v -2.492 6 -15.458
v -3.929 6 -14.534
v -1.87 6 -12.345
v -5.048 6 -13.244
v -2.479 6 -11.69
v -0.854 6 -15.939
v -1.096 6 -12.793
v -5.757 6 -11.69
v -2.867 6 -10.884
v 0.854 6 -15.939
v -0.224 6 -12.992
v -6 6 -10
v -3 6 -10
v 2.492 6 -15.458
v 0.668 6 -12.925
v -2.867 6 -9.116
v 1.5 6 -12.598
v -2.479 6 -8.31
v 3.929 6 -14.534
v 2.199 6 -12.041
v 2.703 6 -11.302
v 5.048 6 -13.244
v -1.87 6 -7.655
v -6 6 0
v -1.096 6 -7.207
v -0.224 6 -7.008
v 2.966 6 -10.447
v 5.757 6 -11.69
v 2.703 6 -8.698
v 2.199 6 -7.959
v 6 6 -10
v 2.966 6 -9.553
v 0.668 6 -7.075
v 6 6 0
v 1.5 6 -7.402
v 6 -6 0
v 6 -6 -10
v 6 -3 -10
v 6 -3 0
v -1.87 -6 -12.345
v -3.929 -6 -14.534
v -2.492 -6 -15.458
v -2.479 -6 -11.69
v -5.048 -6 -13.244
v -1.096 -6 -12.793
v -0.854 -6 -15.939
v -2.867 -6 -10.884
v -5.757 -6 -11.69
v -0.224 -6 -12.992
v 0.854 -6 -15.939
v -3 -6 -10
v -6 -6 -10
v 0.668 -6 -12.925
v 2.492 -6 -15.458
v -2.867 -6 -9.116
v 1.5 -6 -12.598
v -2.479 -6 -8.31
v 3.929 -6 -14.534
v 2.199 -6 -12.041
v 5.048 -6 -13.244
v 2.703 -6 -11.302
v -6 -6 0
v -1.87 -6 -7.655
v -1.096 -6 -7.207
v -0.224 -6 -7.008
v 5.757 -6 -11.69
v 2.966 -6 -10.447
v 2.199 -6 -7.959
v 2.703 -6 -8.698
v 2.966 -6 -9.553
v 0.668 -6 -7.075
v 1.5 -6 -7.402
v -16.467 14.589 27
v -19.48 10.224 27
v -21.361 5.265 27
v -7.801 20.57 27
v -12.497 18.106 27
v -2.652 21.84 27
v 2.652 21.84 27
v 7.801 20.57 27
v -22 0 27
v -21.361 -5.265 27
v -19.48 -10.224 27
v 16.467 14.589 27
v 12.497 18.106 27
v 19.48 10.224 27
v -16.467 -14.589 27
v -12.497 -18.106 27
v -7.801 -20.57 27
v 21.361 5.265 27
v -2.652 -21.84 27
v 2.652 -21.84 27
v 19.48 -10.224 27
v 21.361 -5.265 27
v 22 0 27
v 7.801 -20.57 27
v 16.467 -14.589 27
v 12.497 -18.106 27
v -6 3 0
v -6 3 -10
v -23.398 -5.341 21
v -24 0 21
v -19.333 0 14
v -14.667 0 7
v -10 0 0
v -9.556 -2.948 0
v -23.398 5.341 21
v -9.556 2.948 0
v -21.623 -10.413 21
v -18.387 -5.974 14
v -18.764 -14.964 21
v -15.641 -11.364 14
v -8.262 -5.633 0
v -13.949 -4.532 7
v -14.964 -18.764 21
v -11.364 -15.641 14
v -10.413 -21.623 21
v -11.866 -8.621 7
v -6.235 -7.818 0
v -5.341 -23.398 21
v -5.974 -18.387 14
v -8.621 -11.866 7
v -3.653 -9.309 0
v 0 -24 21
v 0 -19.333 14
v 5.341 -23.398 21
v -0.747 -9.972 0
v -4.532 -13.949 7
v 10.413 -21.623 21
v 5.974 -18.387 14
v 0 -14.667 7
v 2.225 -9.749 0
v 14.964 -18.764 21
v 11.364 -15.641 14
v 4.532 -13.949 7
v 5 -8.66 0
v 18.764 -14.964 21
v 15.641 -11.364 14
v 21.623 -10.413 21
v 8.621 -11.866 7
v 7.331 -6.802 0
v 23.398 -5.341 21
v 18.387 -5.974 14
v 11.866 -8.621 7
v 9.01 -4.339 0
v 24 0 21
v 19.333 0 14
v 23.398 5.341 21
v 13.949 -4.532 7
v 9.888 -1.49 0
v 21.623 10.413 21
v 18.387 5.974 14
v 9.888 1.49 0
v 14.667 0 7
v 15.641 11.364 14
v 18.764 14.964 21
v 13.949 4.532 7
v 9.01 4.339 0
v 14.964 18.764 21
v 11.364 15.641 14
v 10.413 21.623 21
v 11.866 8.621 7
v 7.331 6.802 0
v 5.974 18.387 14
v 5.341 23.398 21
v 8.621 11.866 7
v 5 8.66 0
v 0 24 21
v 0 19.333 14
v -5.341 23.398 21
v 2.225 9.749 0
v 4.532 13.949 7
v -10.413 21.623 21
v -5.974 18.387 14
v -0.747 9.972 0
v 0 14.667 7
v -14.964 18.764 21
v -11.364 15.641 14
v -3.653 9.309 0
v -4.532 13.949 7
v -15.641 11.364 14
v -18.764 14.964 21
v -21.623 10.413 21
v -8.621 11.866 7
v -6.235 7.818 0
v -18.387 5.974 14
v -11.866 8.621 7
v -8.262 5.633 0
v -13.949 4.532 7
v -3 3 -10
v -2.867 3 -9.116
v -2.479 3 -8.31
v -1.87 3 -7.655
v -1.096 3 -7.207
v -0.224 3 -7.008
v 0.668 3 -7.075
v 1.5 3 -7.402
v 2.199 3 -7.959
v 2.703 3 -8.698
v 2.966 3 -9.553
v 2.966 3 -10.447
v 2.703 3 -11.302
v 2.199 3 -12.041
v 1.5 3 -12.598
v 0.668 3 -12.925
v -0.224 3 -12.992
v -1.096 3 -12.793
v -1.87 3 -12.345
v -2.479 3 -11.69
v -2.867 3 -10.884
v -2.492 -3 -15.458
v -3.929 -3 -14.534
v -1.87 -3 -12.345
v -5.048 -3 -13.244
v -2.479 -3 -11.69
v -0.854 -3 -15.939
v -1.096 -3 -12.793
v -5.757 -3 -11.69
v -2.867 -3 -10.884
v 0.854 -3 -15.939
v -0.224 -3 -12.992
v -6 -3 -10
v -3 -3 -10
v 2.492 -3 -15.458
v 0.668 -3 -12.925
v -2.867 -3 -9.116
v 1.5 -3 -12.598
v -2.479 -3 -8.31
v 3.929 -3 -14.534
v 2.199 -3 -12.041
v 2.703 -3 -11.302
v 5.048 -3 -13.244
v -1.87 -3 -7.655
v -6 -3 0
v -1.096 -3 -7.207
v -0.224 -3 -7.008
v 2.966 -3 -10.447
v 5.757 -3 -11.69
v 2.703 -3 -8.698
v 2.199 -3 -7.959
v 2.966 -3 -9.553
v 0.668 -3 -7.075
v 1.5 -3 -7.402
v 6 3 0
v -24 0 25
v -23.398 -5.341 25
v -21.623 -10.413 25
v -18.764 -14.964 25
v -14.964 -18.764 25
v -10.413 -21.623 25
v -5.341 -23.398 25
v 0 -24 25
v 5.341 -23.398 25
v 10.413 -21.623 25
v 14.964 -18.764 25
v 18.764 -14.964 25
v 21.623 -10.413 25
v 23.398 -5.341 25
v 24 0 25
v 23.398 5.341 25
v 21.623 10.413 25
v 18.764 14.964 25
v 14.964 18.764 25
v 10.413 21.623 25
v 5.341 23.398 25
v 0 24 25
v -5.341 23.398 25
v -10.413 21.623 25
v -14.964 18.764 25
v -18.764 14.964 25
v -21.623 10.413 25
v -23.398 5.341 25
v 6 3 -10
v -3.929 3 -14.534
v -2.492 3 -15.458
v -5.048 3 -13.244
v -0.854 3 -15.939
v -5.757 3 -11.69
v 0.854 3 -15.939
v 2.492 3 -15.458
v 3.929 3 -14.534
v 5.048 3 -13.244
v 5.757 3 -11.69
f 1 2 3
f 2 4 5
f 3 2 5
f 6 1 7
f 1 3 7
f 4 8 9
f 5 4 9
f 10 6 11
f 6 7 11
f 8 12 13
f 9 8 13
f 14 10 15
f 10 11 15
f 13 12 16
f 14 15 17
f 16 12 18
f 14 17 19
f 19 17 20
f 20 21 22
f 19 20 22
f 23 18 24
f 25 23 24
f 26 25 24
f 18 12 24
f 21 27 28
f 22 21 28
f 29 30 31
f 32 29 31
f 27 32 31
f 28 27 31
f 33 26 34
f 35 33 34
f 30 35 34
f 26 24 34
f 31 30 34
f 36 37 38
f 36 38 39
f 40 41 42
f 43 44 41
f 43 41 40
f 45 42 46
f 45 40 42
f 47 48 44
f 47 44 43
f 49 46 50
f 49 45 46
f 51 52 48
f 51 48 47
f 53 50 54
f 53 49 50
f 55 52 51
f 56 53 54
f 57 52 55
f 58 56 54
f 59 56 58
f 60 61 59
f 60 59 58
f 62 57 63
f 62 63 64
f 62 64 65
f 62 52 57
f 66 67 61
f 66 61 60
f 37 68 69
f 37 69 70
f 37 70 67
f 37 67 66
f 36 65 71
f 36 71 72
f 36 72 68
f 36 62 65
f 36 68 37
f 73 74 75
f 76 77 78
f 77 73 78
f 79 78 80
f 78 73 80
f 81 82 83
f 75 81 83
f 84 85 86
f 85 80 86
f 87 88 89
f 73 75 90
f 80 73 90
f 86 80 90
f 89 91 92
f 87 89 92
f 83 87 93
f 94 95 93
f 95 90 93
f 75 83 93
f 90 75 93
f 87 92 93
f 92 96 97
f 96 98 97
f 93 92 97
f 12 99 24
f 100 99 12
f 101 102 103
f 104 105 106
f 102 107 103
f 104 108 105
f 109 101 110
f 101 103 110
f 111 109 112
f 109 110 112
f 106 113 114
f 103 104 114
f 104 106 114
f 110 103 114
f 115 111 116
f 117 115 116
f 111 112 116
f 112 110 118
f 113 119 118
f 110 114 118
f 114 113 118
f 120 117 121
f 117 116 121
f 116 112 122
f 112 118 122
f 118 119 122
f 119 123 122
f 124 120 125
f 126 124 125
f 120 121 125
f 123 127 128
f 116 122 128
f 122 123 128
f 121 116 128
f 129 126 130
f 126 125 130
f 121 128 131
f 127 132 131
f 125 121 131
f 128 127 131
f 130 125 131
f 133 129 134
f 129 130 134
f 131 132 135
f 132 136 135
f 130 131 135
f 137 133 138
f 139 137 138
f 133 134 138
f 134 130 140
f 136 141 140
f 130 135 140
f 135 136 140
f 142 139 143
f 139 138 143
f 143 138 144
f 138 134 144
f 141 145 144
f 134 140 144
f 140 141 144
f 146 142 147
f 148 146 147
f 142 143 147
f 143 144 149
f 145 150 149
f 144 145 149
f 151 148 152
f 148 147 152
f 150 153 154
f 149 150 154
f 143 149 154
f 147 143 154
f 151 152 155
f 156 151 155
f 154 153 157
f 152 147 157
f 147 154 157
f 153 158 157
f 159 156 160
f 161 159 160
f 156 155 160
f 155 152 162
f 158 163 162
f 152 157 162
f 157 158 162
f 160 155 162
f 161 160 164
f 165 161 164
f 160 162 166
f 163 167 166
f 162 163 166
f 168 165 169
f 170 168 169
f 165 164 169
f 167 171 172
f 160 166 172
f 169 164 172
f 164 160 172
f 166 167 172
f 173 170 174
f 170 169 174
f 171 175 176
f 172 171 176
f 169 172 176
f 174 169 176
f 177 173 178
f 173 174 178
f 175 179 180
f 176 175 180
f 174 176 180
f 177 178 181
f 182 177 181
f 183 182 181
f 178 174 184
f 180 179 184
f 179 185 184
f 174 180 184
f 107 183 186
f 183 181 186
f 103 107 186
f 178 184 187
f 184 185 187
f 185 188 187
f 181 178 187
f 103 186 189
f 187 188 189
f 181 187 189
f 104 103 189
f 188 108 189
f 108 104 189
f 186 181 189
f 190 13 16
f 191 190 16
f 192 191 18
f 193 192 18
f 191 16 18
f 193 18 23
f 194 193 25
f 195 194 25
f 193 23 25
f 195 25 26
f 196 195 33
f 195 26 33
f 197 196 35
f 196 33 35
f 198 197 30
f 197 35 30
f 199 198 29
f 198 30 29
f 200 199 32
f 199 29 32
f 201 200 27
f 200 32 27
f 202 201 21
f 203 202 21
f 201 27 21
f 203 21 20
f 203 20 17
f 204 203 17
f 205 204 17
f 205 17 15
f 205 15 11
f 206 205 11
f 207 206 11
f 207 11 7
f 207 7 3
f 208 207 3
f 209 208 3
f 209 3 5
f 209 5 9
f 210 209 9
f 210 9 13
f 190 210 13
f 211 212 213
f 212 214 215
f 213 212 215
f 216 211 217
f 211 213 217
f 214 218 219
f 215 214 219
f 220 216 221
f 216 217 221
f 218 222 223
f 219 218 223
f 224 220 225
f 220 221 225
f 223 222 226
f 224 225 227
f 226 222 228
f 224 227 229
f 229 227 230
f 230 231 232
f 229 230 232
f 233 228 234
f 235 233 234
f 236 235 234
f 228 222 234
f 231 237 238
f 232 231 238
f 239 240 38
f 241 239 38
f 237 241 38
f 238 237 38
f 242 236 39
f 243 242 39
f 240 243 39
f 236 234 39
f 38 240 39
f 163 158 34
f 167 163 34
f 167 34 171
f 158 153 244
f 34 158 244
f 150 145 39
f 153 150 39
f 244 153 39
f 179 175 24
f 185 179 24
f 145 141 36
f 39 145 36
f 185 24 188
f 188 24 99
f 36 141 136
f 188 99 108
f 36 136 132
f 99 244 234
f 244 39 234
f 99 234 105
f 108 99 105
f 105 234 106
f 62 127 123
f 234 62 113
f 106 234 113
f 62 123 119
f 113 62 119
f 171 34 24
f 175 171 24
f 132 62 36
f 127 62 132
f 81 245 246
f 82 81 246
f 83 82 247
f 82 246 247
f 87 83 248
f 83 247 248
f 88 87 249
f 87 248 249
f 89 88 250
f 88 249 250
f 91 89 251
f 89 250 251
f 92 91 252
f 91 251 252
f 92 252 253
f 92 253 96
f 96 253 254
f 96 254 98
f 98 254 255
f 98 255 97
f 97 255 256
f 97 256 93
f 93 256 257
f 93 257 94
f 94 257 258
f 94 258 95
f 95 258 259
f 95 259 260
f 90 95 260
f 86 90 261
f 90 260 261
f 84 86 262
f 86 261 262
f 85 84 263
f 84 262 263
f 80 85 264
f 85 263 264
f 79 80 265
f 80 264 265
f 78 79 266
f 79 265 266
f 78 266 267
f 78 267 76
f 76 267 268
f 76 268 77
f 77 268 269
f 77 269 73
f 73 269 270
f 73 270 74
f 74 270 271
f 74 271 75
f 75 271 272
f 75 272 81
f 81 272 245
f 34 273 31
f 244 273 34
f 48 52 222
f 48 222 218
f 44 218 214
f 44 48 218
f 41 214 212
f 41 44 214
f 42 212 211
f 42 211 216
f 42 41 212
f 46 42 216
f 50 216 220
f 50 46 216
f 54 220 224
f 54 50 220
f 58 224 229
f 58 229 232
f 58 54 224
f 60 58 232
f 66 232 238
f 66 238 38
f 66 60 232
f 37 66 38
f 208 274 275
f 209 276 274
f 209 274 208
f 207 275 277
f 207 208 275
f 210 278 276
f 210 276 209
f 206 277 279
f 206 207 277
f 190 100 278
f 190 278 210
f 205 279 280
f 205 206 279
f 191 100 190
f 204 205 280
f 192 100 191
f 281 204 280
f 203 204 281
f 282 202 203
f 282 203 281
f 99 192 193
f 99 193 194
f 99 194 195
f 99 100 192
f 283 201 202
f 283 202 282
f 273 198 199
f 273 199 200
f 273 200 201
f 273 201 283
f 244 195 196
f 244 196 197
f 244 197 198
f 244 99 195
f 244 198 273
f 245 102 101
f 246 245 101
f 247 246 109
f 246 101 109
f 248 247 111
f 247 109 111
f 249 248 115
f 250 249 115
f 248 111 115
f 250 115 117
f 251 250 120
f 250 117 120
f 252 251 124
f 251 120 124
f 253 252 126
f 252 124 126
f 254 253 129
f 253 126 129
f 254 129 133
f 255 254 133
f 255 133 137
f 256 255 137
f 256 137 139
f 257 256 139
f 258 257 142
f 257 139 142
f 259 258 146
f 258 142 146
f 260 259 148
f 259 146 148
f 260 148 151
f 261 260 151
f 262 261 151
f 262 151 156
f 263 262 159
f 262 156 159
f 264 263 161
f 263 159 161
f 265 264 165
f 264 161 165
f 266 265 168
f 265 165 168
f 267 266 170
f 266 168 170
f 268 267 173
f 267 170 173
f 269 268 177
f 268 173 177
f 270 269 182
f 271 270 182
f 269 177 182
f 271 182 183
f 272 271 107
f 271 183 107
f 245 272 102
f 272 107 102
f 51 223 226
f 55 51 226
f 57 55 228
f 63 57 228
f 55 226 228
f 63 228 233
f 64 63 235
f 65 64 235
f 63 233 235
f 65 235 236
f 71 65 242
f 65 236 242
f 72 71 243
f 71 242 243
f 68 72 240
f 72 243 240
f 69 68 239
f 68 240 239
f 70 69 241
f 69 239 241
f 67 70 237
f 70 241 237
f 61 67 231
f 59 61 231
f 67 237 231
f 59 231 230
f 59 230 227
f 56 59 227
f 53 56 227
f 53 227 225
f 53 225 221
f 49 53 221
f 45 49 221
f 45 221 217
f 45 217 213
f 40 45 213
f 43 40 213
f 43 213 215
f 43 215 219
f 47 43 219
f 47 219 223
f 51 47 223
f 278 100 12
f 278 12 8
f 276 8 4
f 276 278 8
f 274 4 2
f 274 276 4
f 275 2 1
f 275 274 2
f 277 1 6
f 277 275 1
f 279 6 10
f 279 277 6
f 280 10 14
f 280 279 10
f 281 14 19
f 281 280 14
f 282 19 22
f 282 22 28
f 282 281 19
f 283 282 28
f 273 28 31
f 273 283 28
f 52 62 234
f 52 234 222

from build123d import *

# Parameters (mm, degrees)
F2_DEPTH = 6
F3_DEPTH = 3
F4_SIZE  = 2
F6_D     = 6


with BuildPart() as f1:
    # F0 (on Front) → F1 (revolve)
    with BuildSketch(Plane.XZ):
        Polygon((-6, 0), (0, 0), (0, 27), (-24, 27), (-24, 21), (-10, 0), align=None)
    revolve(axis=Axis((0, 0, 13.5), (0, 0, 1)))

    # F0 (on Front) → F2 (join, symmetric)
    with BuildSketch(Plane.XZ):
        with BuildLine():
            Line((6, 0), (0, 0))
            Line((0, 0), (-6, 0))
            Line((-6, 0), (-6, -10))
            ThreePointArc((-6, -10), (0, -16), (6, -10))
            Line((6, -10), (6, 0))
        make_face()
    extrude(amount=F2_DEPTH, both=True)

    # F0 (on Front) → F3 (cut, symmetric)
    with BuildSketch(Plane.XZ):
        with BuildLine():
            Line((6, 0), (0, 0))
            Line((0, 0), (-6, 0))
            Line((-6, 0), (-6, -10))
            ThreePointArc((-6, -10), (0, -16), (6, -10))
            Line((6, -10), (6, 0))
        make_face()
    extrude(amount=F3_DEPTH, both=True, mode=Mode.SUBTRACT)

    # F4
    f4_edges = [f1.edges().sort_by_distance(p)[0] for p in [
        (24, 0, 27),
    ]]
    chamfer(f4_edges, length=F4_SIZE)

    # F6 (through all)
    with Locations(Plane.XZ.offset(6)):
        with Locations((0, -10)):
            Hole(F6_D / 2)


solid = f1.part
